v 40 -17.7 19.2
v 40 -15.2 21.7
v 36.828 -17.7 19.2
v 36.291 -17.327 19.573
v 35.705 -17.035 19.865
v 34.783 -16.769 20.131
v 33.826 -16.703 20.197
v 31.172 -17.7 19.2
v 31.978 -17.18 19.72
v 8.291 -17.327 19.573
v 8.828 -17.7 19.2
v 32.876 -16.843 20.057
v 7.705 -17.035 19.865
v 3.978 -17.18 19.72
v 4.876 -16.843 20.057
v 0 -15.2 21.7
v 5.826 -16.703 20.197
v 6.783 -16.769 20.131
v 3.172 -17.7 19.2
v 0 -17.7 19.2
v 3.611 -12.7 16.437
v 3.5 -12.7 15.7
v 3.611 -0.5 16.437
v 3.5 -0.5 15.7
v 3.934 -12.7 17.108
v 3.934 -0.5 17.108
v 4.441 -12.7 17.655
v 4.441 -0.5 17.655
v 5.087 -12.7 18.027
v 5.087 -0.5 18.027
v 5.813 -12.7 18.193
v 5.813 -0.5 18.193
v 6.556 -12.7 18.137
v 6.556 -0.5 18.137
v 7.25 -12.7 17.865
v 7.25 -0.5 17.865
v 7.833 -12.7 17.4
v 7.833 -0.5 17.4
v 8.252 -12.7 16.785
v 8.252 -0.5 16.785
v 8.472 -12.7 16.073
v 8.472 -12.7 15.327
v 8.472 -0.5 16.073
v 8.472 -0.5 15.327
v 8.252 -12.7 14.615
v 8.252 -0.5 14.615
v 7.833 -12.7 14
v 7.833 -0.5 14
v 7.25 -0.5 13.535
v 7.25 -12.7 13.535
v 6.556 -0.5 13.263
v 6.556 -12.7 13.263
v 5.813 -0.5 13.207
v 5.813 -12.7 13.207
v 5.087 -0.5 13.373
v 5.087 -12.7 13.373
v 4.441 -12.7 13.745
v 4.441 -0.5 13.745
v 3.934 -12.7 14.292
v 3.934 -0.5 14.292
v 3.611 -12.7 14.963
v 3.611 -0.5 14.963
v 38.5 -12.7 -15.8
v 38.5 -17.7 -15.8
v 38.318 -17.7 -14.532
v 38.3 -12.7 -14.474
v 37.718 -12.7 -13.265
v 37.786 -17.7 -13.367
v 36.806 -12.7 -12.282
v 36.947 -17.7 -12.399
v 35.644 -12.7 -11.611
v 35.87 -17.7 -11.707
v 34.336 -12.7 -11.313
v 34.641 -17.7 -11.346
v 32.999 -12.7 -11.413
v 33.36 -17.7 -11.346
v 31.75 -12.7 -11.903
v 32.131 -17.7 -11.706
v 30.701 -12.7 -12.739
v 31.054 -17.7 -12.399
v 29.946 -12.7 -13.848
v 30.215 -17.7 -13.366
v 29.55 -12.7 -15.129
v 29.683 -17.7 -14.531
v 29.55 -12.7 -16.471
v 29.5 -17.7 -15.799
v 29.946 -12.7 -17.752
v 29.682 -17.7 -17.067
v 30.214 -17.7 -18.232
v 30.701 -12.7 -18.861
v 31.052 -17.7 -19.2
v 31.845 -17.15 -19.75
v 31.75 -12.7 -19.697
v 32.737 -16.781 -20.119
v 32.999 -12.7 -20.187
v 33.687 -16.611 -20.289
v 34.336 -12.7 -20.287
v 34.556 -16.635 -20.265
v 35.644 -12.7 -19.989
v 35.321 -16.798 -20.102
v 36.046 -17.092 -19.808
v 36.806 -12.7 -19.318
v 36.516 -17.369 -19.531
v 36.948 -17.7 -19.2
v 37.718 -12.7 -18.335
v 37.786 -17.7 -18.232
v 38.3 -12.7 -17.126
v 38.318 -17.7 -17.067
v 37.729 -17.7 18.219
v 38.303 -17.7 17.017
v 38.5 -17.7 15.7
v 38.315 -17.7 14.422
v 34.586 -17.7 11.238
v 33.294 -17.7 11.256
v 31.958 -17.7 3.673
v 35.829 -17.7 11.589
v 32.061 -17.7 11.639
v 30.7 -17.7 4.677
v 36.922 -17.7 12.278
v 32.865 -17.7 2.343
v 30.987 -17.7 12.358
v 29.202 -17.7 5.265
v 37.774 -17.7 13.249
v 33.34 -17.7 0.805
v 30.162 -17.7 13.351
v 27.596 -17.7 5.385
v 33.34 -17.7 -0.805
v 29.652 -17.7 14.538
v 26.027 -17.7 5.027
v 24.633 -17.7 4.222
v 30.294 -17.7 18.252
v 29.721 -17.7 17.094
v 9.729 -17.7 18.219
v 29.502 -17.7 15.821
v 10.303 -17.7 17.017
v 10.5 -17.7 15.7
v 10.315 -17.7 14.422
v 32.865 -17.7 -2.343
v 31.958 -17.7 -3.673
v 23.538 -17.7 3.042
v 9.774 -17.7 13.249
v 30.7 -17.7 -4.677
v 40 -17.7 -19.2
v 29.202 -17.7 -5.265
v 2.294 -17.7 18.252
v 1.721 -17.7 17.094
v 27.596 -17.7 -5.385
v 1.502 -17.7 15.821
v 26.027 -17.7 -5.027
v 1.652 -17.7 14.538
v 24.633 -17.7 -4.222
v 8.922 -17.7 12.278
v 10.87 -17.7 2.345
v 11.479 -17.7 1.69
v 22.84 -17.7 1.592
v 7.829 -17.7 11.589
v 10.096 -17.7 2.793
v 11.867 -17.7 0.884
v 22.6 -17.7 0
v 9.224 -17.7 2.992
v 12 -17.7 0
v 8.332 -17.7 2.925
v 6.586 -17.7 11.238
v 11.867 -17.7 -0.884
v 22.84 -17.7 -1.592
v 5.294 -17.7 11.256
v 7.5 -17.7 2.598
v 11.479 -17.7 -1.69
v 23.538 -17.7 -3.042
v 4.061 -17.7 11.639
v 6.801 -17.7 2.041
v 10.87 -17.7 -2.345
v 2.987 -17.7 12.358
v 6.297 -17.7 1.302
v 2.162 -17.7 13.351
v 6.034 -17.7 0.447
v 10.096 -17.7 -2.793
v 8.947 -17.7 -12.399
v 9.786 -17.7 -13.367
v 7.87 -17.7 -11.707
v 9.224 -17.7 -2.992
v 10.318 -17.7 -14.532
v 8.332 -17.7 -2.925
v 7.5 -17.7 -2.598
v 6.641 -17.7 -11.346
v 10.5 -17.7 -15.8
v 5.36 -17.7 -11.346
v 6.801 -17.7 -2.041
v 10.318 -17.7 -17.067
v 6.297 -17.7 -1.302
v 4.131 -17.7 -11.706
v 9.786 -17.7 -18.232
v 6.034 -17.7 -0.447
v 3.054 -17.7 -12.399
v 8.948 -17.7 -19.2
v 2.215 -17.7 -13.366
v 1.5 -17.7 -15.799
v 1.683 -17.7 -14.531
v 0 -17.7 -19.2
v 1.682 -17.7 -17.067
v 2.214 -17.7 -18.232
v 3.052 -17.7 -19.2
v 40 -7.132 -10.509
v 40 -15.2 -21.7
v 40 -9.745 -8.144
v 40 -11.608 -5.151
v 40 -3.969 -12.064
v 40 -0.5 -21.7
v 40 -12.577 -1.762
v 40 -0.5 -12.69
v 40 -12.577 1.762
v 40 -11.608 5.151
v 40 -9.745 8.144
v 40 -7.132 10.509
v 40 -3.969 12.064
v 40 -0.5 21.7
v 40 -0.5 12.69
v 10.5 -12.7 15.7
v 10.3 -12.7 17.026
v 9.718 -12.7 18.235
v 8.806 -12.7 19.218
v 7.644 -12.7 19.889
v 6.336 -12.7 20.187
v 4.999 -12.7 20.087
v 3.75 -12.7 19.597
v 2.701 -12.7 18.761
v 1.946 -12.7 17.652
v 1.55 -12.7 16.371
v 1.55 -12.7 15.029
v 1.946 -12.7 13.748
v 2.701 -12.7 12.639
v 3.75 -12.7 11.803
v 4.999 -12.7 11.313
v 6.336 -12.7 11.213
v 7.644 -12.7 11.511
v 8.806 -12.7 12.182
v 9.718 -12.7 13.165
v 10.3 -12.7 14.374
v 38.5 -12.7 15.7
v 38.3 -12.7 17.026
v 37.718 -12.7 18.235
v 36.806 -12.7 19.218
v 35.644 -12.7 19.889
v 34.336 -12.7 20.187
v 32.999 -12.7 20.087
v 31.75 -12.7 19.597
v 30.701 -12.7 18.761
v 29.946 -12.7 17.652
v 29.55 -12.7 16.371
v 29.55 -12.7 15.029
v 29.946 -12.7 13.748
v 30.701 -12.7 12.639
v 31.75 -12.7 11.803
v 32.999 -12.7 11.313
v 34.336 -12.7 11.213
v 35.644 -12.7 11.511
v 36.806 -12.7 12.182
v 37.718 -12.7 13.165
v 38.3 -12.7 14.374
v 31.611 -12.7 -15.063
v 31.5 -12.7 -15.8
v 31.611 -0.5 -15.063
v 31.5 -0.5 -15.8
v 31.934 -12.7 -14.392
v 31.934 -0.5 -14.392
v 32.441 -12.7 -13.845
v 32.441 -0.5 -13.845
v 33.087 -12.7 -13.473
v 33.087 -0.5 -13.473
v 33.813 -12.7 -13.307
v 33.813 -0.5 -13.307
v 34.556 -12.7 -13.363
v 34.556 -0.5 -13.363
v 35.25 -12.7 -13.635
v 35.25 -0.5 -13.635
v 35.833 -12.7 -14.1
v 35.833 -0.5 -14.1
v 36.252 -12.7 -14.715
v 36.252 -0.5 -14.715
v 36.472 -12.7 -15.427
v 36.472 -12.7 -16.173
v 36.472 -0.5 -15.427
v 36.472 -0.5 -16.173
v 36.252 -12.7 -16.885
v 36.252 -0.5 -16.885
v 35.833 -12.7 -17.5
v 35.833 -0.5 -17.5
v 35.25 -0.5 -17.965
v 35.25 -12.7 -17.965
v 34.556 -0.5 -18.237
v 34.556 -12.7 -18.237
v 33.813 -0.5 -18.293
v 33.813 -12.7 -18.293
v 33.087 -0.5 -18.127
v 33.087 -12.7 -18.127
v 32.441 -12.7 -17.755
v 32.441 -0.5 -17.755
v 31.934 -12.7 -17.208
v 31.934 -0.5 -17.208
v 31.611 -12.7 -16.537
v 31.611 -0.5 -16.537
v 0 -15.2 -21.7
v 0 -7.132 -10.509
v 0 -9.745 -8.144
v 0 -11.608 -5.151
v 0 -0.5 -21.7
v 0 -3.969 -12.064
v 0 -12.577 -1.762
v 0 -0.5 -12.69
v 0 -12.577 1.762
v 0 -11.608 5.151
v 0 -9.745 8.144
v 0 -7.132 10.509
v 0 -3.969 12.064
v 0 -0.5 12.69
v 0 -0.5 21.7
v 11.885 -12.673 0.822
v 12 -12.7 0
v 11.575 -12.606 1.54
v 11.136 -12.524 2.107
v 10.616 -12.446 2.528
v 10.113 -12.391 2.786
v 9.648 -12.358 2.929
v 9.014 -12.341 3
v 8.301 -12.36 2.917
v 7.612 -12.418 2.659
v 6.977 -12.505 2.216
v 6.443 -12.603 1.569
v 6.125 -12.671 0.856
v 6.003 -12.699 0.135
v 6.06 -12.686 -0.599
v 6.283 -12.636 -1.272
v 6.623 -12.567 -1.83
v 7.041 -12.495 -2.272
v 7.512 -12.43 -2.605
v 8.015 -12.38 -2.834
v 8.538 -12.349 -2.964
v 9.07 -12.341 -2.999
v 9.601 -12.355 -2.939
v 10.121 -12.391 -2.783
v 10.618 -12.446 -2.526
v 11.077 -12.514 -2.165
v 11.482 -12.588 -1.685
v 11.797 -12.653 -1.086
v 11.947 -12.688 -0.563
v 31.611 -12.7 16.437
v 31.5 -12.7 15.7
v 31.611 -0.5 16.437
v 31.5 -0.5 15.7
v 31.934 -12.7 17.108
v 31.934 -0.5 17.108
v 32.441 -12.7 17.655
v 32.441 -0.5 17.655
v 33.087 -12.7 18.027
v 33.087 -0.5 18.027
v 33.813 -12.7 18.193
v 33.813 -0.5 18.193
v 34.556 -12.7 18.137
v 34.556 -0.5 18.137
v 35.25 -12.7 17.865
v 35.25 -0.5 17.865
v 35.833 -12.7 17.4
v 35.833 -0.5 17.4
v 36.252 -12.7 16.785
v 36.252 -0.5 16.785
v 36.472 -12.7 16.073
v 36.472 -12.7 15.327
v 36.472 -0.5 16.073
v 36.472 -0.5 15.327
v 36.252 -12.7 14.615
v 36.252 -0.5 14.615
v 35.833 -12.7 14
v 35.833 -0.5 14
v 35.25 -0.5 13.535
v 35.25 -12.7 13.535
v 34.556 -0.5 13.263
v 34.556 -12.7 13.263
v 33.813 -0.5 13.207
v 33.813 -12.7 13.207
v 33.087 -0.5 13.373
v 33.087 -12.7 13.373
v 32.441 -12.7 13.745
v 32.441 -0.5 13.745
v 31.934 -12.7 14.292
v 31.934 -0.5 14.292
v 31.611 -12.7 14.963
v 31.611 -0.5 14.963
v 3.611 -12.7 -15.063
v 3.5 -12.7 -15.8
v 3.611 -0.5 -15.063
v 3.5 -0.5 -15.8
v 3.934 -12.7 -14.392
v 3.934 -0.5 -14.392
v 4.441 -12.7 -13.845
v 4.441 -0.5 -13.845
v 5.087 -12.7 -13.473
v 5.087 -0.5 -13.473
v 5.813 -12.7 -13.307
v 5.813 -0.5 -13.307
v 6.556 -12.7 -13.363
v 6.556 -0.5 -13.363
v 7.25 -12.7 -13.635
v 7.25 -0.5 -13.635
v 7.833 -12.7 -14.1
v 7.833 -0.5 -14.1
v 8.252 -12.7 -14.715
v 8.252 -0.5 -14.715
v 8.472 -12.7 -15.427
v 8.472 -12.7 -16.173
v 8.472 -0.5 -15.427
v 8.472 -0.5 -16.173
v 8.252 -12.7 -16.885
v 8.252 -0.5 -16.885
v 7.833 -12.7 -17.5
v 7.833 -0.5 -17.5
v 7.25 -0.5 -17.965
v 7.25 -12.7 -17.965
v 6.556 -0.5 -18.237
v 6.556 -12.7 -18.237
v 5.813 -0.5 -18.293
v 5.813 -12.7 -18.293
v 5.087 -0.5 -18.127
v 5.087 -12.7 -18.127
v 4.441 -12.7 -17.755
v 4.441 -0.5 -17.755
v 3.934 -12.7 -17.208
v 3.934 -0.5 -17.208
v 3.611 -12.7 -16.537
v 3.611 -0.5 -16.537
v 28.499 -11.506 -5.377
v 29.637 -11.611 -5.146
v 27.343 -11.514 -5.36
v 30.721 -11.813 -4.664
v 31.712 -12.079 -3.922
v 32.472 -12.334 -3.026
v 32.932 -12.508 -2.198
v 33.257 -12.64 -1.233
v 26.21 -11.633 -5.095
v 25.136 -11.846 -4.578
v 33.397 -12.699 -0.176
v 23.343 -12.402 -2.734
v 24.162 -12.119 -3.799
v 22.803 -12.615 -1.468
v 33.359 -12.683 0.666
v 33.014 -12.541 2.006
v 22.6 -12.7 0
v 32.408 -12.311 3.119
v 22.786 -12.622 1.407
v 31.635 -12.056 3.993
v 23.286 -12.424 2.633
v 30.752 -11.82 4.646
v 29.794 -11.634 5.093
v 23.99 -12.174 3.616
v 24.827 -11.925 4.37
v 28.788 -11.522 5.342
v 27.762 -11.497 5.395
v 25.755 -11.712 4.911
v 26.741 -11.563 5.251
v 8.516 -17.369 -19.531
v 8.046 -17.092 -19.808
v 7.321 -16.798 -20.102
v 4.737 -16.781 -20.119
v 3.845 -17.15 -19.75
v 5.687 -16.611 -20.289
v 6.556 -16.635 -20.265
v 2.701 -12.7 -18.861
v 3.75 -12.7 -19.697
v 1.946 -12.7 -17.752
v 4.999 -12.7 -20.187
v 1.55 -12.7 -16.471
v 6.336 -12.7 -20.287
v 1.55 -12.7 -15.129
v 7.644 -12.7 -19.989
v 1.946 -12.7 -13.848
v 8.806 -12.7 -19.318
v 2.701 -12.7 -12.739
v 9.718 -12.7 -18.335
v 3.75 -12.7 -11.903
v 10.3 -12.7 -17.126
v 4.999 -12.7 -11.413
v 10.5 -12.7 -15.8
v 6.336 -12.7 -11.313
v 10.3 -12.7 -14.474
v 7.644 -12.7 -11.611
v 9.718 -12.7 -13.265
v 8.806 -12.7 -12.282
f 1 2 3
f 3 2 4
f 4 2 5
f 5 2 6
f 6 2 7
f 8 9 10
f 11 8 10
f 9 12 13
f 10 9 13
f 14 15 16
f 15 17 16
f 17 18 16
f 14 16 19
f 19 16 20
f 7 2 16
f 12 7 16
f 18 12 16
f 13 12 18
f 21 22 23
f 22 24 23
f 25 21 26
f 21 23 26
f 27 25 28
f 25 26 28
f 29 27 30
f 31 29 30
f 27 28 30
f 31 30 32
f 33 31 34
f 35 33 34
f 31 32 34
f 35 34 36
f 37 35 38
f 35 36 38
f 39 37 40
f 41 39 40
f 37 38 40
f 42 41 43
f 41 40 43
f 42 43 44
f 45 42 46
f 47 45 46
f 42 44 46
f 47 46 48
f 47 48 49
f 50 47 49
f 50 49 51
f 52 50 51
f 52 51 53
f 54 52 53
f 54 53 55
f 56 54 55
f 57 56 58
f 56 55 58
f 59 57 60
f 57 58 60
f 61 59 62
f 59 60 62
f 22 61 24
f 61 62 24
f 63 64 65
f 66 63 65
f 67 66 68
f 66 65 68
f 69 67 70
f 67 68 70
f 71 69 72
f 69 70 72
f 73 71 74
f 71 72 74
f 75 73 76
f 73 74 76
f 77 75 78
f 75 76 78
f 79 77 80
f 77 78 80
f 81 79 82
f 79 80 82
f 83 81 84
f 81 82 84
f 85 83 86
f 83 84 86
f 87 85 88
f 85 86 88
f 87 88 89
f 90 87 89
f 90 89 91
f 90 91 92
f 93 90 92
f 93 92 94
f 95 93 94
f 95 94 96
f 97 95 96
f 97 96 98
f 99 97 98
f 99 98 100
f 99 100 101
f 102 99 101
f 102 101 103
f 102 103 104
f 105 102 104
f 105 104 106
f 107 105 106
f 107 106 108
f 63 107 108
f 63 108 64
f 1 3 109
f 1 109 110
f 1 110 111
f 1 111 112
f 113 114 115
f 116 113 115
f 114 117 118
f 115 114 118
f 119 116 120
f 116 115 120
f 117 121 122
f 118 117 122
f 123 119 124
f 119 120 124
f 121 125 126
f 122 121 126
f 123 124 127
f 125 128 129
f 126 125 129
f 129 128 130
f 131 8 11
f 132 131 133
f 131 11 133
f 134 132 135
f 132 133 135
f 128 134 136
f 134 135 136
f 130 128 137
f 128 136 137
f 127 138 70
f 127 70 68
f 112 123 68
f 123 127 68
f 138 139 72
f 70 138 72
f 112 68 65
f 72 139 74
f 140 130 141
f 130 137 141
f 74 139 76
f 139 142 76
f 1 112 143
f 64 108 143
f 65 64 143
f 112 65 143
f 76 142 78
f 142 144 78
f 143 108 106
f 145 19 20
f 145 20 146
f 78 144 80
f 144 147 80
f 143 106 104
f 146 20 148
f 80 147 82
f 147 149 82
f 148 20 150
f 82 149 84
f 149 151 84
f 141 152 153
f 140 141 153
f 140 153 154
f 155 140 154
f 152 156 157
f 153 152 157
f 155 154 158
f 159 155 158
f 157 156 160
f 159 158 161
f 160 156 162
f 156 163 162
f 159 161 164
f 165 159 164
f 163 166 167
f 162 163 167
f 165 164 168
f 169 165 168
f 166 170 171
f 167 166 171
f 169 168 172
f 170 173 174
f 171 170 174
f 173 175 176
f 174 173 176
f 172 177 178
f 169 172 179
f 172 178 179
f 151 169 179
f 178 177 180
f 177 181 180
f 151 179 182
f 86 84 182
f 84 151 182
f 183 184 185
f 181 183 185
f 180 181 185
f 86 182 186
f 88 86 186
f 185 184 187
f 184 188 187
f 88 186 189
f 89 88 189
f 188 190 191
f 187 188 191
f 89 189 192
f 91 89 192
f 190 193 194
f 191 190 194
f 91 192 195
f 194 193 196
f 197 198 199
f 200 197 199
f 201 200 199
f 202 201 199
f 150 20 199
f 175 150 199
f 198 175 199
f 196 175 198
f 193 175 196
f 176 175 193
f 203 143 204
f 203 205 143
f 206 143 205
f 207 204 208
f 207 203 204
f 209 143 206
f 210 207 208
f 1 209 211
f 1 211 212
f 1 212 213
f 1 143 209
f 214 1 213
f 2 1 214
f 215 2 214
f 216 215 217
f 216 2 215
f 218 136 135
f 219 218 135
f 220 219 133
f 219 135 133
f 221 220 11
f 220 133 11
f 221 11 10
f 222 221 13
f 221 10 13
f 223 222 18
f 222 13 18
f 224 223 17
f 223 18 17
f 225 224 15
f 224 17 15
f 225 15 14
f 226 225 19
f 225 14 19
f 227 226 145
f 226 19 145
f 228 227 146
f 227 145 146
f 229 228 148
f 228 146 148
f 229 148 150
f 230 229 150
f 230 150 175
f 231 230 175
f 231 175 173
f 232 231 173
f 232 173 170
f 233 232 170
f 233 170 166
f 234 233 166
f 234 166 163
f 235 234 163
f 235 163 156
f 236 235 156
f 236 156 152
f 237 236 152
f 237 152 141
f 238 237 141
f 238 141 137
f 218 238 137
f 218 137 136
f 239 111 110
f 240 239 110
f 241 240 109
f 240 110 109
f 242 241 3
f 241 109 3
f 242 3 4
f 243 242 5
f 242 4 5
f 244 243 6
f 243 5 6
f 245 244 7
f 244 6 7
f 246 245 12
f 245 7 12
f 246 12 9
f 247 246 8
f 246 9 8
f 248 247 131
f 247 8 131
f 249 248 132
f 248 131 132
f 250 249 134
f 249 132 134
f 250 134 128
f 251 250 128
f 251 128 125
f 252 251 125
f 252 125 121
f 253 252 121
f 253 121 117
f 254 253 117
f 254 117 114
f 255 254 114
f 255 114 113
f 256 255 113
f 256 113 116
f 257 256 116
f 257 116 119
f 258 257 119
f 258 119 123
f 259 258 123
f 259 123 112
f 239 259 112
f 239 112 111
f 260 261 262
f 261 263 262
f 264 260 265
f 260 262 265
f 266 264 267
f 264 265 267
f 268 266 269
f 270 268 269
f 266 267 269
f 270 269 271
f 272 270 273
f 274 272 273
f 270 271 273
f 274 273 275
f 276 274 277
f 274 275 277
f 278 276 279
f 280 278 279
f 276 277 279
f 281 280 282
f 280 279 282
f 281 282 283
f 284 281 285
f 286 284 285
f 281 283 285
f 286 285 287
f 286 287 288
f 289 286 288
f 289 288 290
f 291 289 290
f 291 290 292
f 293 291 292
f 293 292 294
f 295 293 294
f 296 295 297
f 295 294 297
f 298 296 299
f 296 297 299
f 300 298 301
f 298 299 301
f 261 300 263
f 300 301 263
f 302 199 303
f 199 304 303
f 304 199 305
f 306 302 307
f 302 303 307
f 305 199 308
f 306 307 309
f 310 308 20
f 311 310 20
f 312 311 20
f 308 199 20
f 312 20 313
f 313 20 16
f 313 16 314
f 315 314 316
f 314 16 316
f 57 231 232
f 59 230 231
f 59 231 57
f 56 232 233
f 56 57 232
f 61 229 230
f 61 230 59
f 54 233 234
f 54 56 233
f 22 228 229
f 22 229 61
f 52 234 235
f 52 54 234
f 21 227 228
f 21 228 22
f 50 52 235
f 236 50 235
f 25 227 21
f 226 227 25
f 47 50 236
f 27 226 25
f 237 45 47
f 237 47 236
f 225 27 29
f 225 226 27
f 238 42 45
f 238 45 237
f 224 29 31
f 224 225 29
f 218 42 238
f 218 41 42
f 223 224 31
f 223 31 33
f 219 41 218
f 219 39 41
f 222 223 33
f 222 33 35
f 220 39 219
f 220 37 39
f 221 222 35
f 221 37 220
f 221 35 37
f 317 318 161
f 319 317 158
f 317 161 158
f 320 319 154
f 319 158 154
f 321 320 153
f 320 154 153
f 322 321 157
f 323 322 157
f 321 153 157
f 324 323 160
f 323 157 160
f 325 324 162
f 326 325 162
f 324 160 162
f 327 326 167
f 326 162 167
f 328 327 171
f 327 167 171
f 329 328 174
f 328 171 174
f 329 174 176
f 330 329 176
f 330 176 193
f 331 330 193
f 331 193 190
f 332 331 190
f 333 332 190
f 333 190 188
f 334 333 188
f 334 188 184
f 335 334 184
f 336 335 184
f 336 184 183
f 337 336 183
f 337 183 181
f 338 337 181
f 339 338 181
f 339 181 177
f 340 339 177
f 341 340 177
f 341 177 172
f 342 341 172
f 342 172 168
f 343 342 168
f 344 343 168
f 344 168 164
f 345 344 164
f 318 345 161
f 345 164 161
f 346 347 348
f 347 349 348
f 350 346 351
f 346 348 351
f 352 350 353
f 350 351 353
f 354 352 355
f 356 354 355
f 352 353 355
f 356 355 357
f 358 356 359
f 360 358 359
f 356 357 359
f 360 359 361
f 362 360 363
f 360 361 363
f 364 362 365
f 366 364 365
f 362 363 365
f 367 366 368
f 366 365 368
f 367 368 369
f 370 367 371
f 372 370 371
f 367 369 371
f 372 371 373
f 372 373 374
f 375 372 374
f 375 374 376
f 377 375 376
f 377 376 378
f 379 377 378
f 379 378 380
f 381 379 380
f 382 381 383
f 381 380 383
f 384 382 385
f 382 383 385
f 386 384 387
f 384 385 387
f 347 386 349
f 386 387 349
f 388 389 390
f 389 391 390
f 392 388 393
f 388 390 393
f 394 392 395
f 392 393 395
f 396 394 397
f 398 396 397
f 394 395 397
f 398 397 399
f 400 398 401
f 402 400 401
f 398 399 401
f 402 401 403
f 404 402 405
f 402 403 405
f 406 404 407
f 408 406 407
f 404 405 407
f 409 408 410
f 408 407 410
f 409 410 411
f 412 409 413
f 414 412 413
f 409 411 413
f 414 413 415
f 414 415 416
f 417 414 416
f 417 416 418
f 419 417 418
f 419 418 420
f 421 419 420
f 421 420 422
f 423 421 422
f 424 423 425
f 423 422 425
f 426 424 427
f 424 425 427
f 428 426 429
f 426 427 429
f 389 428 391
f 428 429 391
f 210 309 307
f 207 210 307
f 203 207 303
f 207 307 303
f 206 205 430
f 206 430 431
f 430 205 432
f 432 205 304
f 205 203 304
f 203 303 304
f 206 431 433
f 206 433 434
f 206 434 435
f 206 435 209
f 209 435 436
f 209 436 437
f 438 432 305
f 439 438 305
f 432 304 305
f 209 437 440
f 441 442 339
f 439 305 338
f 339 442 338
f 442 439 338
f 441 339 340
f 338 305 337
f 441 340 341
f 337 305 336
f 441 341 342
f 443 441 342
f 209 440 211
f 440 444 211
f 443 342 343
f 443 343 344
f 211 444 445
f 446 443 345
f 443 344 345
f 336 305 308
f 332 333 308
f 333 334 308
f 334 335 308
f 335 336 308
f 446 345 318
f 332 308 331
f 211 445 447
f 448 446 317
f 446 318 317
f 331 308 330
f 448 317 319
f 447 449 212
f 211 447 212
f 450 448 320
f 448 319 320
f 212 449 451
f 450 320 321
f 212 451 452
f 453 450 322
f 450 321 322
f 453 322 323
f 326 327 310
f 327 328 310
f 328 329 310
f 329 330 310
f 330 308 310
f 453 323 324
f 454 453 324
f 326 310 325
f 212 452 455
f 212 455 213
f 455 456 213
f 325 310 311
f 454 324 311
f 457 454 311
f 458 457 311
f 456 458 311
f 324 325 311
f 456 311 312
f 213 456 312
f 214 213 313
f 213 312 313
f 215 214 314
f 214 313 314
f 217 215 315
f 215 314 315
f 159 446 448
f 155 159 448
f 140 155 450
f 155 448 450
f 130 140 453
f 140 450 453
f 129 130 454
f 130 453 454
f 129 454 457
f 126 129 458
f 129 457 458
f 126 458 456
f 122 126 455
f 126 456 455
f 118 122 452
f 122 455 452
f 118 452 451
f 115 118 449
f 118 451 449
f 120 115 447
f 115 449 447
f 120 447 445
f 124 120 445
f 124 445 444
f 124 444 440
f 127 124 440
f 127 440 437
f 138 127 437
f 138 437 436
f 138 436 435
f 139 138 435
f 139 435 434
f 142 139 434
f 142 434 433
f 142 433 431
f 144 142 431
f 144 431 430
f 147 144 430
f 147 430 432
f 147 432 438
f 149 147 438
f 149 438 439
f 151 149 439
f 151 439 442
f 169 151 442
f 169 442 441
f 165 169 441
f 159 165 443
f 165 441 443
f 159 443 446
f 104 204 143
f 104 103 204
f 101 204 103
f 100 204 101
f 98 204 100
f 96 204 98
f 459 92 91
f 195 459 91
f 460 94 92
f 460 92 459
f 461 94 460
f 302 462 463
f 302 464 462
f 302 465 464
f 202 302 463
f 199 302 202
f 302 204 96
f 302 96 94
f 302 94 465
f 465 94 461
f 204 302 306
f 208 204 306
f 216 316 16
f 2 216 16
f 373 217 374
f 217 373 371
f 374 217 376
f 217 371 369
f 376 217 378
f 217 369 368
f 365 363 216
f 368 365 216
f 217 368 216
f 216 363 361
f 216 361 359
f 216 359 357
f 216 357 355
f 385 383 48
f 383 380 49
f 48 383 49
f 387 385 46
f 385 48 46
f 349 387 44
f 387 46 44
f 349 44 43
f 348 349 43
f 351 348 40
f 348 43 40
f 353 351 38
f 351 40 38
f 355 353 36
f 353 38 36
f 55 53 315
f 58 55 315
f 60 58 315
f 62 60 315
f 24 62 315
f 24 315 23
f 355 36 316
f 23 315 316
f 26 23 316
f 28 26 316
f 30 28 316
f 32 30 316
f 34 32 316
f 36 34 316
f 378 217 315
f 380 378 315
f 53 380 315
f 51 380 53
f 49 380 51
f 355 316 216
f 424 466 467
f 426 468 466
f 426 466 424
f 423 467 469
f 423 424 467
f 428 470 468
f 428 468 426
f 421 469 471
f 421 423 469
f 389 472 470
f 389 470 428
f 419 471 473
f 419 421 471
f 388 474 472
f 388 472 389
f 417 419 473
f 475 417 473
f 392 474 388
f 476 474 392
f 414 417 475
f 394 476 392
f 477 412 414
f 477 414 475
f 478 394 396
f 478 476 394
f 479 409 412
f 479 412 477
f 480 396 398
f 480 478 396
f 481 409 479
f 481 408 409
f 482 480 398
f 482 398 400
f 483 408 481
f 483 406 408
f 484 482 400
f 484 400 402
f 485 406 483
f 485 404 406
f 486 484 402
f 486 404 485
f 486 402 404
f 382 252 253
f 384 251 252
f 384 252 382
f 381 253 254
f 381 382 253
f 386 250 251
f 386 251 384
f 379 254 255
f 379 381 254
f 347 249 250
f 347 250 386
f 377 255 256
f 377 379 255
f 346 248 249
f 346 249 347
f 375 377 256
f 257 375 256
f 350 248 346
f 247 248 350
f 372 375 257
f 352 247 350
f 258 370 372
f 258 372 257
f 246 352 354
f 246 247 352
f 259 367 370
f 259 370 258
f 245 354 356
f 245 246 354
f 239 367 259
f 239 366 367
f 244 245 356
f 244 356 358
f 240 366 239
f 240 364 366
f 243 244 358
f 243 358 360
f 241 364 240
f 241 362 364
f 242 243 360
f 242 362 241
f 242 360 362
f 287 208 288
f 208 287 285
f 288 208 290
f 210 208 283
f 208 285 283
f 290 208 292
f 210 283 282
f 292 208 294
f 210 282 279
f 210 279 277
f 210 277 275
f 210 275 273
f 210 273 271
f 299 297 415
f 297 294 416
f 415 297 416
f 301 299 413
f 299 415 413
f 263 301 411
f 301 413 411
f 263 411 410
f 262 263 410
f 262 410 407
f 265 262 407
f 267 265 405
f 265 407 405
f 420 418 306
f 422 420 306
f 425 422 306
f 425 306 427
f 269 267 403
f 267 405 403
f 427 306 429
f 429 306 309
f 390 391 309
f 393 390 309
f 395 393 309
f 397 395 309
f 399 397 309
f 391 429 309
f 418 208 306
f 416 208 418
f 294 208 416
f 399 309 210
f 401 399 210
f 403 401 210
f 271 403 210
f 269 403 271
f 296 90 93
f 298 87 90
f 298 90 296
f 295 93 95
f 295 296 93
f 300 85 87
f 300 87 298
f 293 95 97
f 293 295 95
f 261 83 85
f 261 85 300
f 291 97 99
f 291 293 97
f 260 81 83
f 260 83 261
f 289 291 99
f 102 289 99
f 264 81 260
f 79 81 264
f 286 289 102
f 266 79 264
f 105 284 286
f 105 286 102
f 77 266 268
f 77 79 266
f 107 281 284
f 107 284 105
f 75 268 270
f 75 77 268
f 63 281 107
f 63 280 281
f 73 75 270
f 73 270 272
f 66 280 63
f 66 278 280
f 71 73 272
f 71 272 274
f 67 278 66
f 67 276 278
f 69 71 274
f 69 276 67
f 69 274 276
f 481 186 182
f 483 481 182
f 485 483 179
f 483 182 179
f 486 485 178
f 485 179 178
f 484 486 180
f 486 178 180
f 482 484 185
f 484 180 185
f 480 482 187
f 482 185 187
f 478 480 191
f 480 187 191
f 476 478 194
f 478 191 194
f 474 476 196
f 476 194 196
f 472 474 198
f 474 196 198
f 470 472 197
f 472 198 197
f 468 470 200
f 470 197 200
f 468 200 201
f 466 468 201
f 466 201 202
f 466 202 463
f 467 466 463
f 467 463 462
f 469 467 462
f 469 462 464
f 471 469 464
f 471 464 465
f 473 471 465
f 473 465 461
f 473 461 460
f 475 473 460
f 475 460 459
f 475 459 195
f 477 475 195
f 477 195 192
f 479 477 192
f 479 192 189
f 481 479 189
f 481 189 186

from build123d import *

# Parameters (mm, degrees)
F1_DEPTH       = 40
F3_D           = 5
F3_CBORE_D     = 9
F3_CBORE_DEPTH = 5
F4_T1_DEPTH    = 52.8584149398
F5_R           = 3
F6_DEPTH       = 17.201
F8_D           = 10.8
F8_DEPTH       = 11.35
F8_TIP         = 3.2446473427


# Not quite as in the source:
# - a fillet or chamfer that OpenCascade refuses, or shapes differently, is made with other operations: its cross-section is extruded or revolved along the edge and cut away or added


with BuildPart() as f1:
    # F0 (on Right) → F1 (new body)
    with BuildSketch(Plane.YZ):
        with BuildLine():
            ThreePointArc((-0.5, -12.6901536634), (-12.7, 0), (-0.5, 12.6901536634))
            Line((-0.5, 12.6901536634), (-0.5, 21.7))
            Line((-0.5, 21.7), (-17.7, 21.7))
            Line((-17.7, 21.7), (-17.7, -21.7))
            Line((-17.7, -21.7), (-0.5, -21.7))
            Line((-0.5, -21.7), (-0.5, -12.6901536634))
        make_face()
    extrude(amount=F1_DEPTH)

    # F3 (through all)
    with Locations(Plane.XZ.offset(17.7)):
        with Locations((6, 15.7), (34, 15.7), (34, -15.8), (6, -15.8)):
            CounterBoreHole(F3_D / 2, F3_CBORE_D / 2, F3_CBORE_DEPTH)

    # F4: chamfer of 2.5 on 2 edges, made by hand

    # F4_s2 → F4_t1 (cut)
    with BuildSketch(Plane.YZ.offset(-6.4292074699)):
        Polygon((-15.2, 21.7), (-17.7, 19.2), (-17.7, 21.7), align=None)
        Polygon((-15.2, -21.7), (-17.7, -19.2), (-17.7, -21.7), align=None)
    extrude(amount=F4_T1_DEPTH, mode=Mode.SUBTRACT)

    # F5 (on face) → F6 (cut, through all)
    with BuildSketch(Plane.XZ.offset(17.7)):
        with Locations((9, 0)):
            Circle(F5_R)
    extrude(amount=-F6_DEPTH, mode=Mode.SUBTRACT)

    # F8
    with Locations(Plane.XZ.offset(17.7)):
        with Locations((28, 0)):
            Hole(F8_D / 2, depth=F8_DEPTH)
            with Locations((0, 0, -(F8_DEPTH + F8_TIP / 2))):  # 118° drill point
                Cone(0, F8_D / 2, F8_TIP, mode=Mode.SUBTRACT)


solid = f1.part
